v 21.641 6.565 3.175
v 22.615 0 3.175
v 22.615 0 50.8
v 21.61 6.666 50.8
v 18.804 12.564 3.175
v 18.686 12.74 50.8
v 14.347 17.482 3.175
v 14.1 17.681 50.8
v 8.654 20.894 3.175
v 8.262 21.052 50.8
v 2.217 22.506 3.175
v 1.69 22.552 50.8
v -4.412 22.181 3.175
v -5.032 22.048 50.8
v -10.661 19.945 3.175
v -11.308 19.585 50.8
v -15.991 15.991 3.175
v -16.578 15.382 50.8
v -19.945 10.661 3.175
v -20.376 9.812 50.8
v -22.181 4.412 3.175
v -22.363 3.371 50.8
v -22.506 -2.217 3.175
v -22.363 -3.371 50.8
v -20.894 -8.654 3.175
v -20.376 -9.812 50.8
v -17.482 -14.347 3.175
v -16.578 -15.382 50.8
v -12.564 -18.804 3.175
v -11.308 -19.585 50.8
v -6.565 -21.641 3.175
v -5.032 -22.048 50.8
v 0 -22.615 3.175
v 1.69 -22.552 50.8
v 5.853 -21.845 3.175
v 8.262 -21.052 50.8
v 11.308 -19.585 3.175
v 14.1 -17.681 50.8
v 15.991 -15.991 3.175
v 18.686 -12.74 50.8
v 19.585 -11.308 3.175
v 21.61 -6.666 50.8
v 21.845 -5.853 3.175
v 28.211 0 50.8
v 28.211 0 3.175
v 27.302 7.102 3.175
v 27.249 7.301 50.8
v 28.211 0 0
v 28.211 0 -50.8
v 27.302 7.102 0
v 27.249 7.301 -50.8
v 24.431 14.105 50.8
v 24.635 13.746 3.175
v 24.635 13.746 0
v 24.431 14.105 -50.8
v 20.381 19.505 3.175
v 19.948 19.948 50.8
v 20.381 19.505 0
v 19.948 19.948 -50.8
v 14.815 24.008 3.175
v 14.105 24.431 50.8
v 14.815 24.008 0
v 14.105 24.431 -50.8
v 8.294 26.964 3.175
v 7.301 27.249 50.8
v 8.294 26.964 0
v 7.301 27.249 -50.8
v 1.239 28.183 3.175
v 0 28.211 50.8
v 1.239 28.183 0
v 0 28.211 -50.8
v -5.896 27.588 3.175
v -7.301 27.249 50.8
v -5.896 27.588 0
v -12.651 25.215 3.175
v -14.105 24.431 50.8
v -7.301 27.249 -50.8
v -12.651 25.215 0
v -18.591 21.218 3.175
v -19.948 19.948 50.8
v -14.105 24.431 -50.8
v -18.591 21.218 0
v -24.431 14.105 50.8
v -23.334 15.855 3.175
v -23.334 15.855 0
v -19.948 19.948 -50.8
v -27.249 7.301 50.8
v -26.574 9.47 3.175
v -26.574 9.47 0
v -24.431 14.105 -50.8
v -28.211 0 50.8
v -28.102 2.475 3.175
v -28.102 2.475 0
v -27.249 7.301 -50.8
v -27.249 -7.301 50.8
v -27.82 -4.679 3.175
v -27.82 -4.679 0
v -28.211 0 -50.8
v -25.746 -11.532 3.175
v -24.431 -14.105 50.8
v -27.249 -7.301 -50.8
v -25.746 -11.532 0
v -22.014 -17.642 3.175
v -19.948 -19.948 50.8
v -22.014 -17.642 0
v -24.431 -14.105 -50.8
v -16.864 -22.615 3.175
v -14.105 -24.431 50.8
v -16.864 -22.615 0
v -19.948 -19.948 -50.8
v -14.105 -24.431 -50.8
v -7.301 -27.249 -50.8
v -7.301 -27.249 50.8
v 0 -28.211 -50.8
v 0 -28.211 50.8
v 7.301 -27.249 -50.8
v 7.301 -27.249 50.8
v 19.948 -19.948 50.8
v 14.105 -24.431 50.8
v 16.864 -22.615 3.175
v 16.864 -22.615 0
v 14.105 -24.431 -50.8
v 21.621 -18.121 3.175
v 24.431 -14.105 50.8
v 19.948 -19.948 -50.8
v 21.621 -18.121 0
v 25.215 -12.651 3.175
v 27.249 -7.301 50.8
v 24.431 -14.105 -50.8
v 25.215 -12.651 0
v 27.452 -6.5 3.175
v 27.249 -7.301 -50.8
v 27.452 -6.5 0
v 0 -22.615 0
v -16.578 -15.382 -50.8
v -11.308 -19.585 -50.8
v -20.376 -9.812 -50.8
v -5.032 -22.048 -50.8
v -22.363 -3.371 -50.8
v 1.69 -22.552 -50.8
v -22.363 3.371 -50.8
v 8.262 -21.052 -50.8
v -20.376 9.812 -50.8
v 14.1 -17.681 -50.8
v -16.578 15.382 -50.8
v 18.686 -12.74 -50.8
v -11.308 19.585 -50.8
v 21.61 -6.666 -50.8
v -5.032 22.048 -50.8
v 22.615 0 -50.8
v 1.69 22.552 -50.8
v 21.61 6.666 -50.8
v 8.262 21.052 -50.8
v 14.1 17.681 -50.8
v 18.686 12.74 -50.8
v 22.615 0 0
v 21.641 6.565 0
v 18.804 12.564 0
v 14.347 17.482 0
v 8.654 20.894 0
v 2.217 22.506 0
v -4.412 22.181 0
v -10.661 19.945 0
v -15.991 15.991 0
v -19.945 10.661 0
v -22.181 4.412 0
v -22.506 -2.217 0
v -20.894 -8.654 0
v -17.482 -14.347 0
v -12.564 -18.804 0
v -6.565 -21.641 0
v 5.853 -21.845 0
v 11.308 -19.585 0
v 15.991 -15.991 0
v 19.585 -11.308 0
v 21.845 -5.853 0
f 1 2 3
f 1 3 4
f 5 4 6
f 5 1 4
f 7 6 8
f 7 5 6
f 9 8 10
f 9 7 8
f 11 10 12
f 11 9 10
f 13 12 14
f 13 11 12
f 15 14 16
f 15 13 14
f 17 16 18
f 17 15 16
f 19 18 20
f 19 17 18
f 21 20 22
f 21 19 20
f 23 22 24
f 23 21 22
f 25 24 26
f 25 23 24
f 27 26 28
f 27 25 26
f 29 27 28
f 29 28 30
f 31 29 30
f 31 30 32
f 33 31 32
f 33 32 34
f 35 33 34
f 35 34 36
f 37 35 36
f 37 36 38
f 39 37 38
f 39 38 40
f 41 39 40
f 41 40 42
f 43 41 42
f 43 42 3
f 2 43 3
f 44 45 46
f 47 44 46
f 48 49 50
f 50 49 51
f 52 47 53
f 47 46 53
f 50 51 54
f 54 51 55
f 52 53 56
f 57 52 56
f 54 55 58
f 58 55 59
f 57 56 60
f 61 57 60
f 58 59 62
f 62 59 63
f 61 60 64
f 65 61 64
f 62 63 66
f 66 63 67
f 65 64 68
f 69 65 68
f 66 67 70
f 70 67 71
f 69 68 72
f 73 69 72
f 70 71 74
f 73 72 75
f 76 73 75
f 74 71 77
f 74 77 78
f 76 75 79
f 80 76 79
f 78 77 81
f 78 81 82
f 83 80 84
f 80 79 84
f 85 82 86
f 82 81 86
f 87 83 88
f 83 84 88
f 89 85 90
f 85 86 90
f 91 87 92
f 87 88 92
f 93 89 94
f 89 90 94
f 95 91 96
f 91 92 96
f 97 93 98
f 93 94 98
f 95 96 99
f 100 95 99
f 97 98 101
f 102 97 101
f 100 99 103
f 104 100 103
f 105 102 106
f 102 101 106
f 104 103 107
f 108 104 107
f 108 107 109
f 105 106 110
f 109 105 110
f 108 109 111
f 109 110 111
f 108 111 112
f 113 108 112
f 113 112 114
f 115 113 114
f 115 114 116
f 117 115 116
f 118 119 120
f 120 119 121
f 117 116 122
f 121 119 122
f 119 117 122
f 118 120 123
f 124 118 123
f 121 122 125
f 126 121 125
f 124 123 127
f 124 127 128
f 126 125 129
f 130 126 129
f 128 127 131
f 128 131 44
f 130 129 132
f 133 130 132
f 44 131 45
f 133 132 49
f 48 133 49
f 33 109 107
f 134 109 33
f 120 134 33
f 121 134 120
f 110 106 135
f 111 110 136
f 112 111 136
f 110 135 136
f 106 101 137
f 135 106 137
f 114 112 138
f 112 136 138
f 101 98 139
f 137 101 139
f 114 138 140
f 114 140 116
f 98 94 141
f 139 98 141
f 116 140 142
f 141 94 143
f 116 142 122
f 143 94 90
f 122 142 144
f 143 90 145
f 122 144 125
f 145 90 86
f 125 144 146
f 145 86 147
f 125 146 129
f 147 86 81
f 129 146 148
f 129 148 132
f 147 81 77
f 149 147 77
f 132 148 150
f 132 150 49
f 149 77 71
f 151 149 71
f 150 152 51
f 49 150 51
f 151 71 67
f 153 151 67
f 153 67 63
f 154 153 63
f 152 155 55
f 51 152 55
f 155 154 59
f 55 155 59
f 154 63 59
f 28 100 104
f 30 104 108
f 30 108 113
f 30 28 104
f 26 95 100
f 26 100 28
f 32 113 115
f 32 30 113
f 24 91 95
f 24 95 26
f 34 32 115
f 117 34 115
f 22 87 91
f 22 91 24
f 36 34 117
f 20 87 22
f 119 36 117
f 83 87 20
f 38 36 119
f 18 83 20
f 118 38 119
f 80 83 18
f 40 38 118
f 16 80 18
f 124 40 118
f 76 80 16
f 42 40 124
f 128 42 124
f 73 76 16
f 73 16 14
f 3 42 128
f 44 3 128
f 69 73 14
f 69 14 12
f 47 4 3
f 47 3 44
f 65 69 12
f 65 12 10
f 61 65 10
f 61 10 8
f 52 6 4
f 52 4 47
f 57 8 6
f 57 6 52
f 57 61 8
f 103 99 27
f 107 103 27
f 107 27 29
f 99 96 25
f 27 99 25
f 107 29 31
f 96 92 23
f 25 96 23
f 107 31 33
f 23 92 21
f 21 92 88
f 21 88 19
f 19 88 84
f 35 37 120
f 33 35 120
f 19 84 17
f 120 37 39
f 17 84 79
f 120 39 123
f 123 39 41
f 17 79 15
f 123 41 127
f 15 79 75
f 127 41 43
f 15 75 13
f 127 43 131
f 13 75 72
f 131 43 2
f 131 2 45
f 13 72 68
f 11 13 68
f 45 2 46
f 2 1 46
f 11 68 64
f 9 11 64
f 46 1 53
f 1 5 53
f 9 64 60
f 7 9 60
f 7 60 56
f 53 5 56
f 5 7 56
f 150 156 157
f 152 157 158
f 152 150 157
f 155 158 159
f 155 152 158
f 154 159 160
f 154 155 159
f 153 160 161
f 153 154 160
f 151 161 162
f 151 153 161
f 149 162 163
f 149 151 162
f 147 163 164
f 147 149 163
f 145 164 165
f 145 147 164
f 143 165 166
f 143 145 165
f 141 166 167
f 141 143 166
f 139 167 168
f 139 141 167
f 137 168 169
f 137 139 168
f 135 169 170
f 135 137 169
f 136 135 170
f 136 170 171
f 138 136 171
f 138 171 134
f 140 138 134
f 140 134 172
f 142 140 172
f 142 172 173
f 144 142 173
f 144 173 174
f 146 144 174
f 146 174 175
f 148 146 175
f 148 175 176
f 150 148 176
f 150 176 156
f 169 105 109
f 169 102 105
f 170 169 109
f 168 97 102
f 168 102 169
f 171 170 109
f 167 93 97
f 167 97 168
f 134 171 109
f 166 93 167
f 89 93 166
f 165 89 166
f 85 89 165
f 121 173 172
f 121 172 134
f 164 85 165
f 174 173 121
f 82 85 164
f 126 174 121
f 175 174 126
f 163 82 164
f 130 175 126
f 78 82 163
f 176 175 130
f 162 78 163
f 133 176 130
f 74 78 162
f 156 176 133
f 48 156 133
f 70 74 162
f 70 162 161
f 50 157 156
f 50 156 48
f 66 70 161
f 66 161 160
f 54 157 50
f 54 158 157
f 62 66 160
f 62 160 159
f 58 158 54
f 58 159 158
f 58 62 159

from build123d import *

# Parameters (mm, degrees)
F0_R     = 28.2106727932
F0_R_2   = 22.6152096398
F1_DEPTH = 101.6
F3_W     = 56.4213455863
F3_H     = 50.825882433
F4_DEPTH = 3.175


with BuildPart() as f1:
    # F0 (on Top) → F1 (new body)
    with BuildSketch(Plane.XY):
        Circle(F0_R)
        Circle(F0_R_2, mode=Mode.SUBTRACT)
    extrude(amount=F1_DEPTH)


with BuildPart() as f1_1:
    # F2: moved
    add(f1.part.moved(Location((0, 0, -50.8))))

    # F3 (on Top) → F4 (cut)
    with BuildSketch(Plane.XY):
        with Locations((0, 2.7977315767)):
            Rectangle(F3_W, F3_H)
    extrude(amount=F4_DEPTH, mode=Mode.SUBTRACT)


solid = f1_1.part
